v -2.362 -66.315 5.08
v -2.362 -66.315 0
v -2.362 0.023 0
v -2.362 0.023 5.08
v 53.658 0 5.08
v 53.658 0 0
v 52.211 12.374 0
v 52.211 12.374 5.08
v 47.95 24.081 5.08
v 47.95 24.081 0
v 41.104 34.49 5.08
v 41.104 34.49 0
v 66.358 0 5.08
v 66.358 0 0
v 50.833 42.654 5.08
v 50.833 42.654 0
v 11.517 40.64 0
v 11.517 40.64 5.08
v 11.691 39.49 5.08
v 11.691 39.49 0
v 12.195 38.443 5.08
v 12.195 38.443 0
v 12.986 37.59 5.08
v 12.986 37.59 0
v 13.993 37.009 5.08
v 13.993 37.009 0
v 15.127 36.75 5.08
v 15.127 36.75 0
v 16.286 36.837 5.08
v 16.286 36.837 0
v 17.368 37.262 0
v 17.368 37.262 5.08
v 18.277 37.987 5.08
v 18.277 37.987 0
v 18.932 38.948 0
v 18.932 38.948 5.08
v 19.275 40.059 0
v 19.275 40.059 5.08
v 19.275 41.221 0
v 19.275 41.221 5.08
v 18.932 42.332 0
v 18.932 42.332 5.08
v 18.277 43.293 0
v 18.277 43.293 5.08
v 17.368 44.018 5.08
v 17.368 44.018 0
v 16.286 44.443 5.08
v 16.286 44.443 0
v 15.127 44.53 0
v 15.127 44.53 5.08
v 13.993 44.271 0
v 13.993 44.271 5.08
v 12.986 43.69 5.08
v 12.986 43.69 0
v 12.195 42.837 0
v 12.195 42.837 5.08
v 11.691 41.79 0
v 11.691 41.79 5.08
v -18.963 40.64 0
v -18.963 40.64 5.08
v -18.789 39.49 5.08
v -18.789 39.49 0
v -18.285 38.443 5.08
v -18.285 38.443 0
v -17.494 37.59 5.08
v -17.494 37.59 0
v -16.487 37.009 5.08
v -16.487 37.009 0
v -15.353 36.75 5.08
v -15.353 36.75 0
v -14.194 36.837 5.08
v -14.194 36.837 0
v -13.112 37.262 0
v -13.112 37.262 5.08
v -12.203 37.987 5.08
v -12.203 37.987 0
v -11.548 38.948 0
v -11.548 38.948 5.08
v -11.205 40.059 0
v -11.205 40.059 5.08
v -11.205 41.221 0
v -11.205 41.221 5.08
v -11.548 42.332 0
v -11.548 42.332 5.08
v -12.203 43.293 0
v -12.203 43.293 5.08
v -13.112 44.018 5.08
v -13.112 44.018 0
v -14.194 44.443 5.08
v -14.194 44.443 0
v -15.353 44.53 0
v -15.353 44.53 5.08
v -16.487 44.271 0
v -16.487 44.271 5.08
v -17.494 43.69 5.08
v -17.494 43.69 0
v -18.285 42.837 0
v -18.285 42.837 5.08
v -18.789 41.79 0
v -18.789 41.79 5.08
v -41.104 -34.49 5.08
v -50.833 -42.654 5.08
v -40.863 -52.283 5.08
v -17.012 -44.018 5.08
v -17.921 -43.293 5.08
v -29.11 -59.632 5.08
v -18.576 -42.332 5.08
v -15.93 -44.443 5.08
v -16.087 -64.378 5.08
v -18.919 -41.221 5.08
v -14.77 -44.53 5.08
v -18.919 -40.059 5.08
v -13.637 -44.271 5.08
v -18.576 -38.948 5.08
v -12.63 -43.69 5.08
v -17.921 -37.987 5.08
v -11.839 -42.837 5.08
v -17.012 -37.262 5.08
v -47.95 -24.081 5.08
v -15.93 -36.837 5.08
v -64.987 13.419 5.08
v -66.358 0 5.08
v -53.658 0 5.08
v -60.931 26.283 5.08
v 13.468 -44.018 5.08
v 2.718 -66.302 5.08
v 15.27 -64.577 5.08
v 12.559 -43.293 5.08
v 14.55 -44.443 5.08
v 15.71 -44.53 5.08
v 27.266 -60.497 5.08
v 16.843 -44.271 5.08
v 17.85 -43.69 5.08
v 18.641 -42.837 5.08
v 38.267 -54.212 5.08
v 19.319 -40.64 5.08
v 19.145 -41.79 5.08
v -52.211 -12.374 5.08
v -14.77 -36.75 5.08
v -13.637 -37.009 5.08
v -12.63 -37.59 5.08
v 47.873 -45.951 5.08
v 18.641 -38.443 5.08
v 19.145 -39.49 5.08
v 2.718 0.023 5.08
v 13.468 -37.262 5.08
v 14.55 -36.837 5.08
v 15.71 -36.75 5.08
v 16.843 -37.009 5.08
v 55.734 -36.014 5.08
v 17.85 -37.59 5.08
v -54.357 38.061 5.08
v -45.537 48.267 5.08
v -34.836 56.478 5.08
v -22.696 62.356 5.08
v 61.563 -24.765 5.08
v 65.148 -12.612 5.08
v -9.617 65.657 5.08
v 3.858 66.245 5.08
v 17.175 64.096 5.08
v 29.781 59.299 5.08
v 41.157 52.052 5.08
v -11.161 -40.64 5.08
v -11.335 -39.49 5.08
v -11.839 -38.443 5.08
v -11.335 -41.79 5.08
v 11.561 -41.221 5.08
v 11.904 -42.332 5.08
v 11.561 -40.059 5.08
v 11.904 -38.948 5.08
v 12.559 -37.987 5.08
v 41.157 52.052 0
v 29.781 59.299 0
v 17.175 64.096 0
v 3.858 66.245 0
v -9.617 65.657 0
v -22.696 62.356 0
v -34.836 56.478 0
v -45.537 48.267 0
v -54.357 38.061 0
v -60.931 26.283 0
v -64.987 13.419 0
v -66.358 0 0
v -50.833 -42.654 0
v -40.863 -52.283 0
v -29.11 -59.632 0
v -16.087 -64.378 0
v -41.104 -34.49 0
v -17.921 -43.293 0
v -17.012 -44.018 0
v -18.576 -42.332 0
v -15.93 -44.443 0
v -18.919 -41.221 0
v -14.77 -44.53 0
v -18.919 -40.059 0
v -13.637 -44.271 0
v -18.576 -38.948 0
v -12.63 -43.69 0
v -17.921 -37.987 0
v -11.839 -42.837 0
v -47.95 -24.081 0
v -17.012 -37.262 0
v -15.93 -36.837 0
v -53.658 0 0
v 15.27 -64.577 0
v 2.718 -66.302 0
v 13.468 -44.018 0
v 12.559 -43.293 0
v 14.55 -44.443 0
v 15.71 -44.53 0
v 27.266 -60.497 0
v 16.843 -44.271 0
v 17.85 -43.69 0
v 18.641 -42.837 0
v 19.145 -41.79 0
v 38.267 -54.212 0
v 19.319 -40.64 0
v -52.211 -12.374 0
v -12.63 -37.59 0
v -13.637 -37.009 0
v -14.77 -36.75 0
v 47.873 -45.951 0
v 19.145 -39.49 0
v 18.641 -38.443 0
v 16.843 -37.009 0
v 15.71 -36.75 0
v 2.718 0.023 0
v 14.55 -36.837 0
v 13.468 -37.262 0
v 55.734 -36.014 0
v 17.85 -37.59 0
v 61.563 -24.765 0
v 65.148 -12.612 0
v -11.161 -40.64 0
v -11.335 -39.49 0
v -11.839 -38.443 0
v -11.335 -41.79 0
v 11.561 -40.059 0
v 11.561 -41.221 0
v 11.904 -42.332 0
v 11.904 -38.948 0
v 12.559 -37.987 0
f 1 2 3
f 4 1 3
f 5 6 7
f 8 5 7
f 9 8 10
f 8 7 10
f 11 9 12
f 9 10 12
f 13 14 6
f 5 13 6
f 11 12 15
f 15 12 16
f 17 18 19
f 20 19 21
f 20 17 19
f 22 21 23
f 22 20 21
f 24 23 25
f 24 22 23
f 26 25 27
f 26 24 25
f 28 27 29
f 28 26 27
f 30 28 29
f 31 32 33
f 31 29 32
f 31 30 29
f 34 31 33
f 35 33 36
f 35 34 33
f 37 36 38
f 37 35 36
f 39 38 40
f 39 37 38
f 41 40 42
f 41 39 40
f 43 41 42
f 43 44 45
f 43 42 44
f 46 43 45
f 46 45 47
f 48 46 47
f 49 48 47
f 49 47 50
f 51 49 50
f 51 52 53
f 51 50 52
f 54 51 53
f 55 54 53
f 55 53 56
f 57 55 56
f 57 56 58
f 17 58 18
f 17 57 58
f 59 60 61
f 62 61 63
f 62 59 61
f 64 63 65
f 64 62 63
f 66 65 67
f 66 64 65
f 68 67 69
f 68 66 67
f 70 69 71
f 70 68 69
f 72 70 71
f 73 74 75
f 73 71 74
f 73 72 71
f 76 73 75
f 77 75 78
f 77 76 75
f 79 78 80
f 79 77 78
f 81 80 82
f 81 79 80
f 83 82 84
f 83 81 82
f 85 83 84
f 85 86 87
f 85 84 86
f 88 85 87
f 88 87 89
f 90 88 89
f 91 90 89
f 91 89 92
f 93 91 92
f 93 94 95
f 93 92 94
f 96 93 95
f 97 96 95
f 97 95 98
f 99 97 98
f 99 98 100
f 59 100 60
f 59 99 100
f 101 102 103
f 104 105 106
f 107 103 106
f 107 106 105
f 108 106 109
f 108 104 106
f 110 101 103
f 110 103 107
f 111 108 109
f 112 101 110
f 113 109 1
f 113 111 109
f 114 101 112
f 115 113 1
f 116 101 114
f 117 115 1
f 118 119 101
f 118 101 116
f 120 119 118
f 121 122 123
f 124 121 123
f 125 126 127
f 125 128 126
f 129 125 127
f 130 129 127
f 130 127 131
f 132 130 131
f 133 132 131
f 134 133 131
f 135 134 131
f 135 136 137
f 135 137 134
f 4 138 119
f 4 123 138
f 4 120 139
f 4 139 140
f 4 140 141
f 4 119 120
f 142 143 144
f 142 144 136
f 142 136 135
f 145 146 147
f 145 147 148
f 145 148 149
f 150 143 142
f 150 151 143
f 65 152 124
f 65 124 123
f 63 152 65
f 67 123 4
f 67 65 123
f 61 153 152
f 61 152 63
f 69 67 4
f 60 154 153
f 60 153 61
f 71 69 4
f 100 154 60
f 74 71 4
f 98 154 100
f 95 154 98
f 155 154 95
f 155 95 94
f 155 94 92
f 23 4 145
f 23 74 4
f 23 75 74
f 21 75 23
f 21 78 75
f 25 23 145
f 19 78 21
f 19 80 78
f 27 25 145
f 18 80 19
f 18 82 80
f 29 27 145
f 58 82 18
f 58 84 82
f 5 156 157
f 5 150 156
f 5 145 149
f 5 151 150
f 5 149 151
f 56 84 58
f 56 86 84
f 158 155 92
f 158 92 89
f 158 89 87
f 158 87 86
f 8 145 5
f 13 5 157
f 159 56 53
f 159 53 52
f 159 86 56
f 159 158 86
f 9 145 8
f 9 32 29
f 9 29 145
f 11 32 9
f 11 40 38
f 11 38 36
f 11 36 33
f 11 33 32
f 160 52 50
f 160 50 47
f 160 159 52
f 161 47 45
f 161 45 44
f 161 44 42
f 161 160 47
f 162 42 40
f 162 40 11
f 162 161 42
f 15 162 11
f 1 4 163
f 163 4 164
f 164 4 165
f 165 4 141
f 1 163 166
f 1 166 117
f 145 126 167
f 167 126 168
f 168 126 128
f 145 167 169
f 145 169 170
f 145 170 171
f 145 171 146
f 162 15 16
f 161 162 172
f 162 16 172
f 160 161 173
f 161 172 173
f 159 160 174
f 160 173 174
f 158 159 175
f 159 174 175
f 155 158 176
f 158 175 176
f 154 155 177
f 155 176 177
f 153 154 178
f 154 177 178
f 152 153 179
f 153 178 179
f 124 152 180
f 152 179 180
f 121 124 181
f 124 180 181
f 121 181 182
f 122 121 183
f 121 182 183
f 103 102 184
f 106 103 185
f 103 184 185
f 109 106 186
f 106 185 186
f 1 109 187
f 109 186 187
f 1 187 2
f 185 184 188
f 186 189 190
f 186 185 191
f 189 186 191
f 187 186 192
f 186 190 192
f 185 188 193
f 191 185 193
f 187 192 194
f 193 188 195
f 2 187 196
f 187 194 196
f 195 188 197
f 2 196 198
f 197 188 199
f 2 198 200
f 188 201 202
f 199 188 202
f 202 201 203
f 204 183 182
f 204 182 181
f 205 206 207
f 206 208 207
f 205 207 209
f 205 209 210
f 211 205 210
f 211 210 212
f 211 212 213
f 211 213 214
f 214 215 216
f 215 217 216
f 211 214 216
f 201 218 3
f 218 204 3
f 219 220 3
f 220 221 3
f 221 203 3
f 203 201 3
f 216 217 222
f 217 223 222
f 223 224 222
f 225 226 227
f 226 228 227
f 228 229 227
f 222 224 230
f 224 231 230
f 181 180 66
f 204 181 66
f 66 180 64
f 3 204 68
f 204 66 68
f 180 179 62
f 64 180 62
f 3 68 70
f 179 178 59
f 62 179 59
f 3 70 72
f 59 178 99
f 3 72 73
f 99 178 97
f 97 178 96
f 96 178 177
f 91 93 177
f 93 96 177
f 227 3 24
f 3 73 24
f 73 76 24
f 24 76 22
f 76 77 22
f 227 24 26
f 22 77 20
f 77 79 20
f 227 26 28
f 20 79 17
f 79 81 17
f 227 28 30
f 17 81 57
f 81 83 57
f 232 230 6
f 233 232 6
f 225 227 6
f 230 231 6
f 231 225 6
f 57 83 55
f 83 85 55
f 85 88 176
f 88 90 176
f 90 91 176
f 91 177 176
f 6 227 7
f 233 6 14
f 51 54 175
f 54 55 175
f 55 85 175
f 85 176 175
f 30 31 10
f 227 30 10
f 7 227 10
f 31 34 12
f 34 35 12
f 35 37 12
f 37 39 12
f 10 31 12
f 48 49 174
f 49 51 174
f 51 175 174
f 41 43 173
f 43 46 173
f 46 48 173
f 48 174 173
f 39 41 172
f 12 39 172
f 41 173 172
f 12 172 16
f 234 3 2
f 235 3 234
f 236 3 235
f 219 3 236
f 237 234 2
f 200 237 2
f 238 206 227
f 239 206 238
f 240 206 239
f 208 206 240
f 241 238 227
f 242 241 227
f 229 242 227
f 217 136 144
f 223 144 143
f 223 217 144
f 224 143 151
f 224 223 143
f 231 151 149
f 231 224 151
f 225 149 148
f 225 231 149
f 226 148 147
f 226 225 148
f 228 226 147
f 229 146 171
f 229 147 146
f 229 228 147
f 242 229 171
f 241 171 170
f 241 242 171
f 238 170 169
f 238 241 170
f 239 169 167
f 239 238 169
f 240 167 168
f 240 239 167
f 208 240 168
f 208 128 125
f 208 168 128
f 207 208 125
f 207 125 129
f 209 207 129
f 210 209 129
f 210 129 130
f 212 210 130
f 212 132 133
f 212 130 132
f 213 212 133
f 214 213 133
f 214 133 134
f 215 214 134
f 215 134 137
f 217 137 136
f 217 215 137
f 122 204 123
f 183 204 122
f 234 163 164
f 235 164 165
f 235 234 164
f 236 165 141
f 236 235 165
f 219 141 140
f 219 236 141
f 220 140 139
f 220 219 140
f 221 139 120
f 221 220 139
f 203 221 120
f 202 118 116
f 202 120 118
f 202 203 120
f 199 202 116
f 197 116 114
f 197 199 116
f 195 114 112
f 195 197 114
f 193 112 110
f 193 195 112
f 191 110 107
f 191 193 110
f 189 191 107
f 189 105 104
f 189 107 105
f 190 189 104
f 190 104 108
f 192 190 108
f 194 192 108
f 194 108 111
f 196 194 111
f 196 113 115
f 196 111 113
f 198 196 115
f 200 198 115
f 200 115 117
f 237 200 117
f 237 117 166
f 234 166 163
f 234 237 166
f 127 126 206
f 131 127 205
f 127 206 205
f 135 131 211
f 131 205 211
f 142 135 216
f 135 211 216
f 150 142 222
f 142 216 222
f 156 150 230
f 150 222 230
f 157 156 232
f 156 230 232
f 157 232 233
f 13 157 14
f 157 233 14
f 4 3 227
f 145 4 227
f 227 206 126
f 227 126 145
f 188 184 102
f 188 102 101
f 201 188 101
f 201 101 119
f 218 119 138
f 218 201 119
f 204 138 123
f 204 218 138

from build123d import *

# Parameters (mm, degrees)
SKETCH1_R           = 66.3575
BOSS_EXTRUDE1_DEPTH = 5.08
CUT_EXTRUDE2_REACH  = 95.981
SKETCH3_R           = 3.900616975
SKETCH3_W           = 5.08
SKETCH3_H           = 67.8815


with BuildPart() as part:
    # Sketch1 → Boss-Extrude1 (new body)
    with BuildSketch(Plane.XY):
        Circle(SKETCH1_R)
    extrude(amount=BOSS_EXTRUDE1_DEPTH)

    # Sketch3 → Cut-Extrude2 (cut, up to next)
    with BuildSketch(Plane.XY, mode=Mode.PRIVATE) as cut_extrude2_sk1:
        with BuildLine():
            Line((-50.832794134, -42.65377881), (-41.104029707, -34.490376167))
            ThreePointArc((-41.104029707, -34.490376167), (-50.4215568, -18.35194584), (-53.6575, 0))
            Line((-53.6575, 0), (-66.3575, 0))
            ThreePointArc((-66.3575, 0), (-62.355653084, -22.695601661), (-50.832794134, -42.65377881))
        make_face()
    cut_extrude2_tool1 = extrude(cut_extrude2_sk1.sketch, amount=CUT_EXTRUDE2_REACH, mode=Mode.PRIVATE) & part.part
    # Sketch3 → Cut-Extrude2 (cut, up to next)
    with BuildSketch(Plane.XY, mode=Mode.PRIVATE) as cut_extrude2_sk2:
        with BuildLine():
            ThreePointArc((50.832794134, 42.65377881), (62.355653084, 22.695601661), (66.3575, 0))
            Line((66.3575, 0), (53.6575, 0))
            ThreePointArc((53.6575, 0), (50.4215568, 18.35194584), (41.104029707, 34.490376167))
            Line((41.104029707, 34.490376167), (50.832794134, 42.65377881))
        make_face()
    cut_extrude2_tool2 = extrude(cut_extrude2_sk2.sketch, amount=CUT_EXTRUDE2_REACH, mode=Mode.PRIVATE) & part.part
    # Sketch3 → Cut-Extrude2 (cut, up to next)
    with BuildSketch(Plane.XY, mode=Mode.PRIVATE) as cut_extrude2_sk3:
        with Locations((15.41807752, -40.64)):
            Circle(SKETCH3_R)
    cut_extrude2_tool3 = extrude(cut_extrude2_sk3.sketch, amount=CUT_EXTRUDE2_REACH, mode=Mode.PRIVATE) & part.part
    # Sketch3 → Cut-Extrude2 (cut, up to next)
    with BuildSketch(Plane.XY, mode=Mode.PRIVATE) as cut_extrude2_sk4:
        with Locations((-15.06192248, -40.64)):
            Circle(SKETCH3_R)
    cut_extrude2_tool4 = extrude(cut_extrude2_sk4.sketch, amount=CUT_EXTRUDE2_REACH, mode=Mode.PRIVATE) & part.part
    # Sketch3 → Cut-Extrude2 (cut, up to next)
    with BuildSketch(Plane.XY, mode=Mode.PRIVATE) as cut_extrude2_sk5:
        with Locations(Location((15.41807752, 40.64, 0), (0, 0, 180))):
            Circle(SKETCH3_R)
    cut_extrude2_tool5 = extrude(cut_extrude2_sk5.sketch, amount=CUT_EXTRUDE2_REACH, mode=Mode.PRIVATE) & part.part
    # Sketch3 → Cut-Extrude2 (cut, up to next)
    with BuildSketch(Plane.XY, mode=Mode.PRIVATE) as cut_extrude2_sk6:
        with Locations(Location((-15.06192248, 40.64, 0), (0, 0, 180))):
            Circle(SKETCH3_R)
    cut_extrude2_tool6 = extrude(cut_extrude2_sk6.sketch, amount=CUT_EXTRUDE2_REACH, mode=Mode.PRIVATE) & part.part
    # Sketch3 → Cut-Extrude2 (cut, up to next)
    with BuildSketch(Plane.XY, mode=Mode.PRIVATE) as cut_extrude2_sk7:
        with Locations((0.17807752, -33.91789821)):
            Rectangle(SKETCH3_W, SKETCH3_H)
    cut_extrude2_tool7 = extrude(cut_extrude2_sk7.sketch, amount=CUT_EXTRUDE2_REACH, mode=Mode.PRIVATE) & part.part
    add(cut_extrude2_tool1.solids().sort_by_distance((-55.456661, -20.184574, 0))[0], mode=Mode.SUBTRACT)
    add(cut_extrude2_tool2.solids().sort_by_distance((55.456661, 20.184574, 0))[0], mode=Mode.SUBTRACT)
    add(cut_extrude2_tool3.solids().sort_by_distance((15.418078, -40.64, 0))[0], mode=Mode.SUBTRACT)
    add(cut_extrude2_tool4.solids().sort_by_distance((-15.061922, -40.64, 0))[0], mode=Mode.SUBTRACT)
    add(cut_extrude2_tool5.solids().sort_by_distance((15.418078, 40.64, 0))[0], mode=Mode.SUBTRACT)
    add(cut_extrude2_tool6.solids().sort_by_distance((-15.061922, 40.64, 0))[0], mode=Mode.SUBTRACT)
    add(cut_extrude2_tool7.solids().sort_by_distance((0.178078, -33.917898, 0))[0], mode=Mode.SUBTRACT)


solid = part.part
